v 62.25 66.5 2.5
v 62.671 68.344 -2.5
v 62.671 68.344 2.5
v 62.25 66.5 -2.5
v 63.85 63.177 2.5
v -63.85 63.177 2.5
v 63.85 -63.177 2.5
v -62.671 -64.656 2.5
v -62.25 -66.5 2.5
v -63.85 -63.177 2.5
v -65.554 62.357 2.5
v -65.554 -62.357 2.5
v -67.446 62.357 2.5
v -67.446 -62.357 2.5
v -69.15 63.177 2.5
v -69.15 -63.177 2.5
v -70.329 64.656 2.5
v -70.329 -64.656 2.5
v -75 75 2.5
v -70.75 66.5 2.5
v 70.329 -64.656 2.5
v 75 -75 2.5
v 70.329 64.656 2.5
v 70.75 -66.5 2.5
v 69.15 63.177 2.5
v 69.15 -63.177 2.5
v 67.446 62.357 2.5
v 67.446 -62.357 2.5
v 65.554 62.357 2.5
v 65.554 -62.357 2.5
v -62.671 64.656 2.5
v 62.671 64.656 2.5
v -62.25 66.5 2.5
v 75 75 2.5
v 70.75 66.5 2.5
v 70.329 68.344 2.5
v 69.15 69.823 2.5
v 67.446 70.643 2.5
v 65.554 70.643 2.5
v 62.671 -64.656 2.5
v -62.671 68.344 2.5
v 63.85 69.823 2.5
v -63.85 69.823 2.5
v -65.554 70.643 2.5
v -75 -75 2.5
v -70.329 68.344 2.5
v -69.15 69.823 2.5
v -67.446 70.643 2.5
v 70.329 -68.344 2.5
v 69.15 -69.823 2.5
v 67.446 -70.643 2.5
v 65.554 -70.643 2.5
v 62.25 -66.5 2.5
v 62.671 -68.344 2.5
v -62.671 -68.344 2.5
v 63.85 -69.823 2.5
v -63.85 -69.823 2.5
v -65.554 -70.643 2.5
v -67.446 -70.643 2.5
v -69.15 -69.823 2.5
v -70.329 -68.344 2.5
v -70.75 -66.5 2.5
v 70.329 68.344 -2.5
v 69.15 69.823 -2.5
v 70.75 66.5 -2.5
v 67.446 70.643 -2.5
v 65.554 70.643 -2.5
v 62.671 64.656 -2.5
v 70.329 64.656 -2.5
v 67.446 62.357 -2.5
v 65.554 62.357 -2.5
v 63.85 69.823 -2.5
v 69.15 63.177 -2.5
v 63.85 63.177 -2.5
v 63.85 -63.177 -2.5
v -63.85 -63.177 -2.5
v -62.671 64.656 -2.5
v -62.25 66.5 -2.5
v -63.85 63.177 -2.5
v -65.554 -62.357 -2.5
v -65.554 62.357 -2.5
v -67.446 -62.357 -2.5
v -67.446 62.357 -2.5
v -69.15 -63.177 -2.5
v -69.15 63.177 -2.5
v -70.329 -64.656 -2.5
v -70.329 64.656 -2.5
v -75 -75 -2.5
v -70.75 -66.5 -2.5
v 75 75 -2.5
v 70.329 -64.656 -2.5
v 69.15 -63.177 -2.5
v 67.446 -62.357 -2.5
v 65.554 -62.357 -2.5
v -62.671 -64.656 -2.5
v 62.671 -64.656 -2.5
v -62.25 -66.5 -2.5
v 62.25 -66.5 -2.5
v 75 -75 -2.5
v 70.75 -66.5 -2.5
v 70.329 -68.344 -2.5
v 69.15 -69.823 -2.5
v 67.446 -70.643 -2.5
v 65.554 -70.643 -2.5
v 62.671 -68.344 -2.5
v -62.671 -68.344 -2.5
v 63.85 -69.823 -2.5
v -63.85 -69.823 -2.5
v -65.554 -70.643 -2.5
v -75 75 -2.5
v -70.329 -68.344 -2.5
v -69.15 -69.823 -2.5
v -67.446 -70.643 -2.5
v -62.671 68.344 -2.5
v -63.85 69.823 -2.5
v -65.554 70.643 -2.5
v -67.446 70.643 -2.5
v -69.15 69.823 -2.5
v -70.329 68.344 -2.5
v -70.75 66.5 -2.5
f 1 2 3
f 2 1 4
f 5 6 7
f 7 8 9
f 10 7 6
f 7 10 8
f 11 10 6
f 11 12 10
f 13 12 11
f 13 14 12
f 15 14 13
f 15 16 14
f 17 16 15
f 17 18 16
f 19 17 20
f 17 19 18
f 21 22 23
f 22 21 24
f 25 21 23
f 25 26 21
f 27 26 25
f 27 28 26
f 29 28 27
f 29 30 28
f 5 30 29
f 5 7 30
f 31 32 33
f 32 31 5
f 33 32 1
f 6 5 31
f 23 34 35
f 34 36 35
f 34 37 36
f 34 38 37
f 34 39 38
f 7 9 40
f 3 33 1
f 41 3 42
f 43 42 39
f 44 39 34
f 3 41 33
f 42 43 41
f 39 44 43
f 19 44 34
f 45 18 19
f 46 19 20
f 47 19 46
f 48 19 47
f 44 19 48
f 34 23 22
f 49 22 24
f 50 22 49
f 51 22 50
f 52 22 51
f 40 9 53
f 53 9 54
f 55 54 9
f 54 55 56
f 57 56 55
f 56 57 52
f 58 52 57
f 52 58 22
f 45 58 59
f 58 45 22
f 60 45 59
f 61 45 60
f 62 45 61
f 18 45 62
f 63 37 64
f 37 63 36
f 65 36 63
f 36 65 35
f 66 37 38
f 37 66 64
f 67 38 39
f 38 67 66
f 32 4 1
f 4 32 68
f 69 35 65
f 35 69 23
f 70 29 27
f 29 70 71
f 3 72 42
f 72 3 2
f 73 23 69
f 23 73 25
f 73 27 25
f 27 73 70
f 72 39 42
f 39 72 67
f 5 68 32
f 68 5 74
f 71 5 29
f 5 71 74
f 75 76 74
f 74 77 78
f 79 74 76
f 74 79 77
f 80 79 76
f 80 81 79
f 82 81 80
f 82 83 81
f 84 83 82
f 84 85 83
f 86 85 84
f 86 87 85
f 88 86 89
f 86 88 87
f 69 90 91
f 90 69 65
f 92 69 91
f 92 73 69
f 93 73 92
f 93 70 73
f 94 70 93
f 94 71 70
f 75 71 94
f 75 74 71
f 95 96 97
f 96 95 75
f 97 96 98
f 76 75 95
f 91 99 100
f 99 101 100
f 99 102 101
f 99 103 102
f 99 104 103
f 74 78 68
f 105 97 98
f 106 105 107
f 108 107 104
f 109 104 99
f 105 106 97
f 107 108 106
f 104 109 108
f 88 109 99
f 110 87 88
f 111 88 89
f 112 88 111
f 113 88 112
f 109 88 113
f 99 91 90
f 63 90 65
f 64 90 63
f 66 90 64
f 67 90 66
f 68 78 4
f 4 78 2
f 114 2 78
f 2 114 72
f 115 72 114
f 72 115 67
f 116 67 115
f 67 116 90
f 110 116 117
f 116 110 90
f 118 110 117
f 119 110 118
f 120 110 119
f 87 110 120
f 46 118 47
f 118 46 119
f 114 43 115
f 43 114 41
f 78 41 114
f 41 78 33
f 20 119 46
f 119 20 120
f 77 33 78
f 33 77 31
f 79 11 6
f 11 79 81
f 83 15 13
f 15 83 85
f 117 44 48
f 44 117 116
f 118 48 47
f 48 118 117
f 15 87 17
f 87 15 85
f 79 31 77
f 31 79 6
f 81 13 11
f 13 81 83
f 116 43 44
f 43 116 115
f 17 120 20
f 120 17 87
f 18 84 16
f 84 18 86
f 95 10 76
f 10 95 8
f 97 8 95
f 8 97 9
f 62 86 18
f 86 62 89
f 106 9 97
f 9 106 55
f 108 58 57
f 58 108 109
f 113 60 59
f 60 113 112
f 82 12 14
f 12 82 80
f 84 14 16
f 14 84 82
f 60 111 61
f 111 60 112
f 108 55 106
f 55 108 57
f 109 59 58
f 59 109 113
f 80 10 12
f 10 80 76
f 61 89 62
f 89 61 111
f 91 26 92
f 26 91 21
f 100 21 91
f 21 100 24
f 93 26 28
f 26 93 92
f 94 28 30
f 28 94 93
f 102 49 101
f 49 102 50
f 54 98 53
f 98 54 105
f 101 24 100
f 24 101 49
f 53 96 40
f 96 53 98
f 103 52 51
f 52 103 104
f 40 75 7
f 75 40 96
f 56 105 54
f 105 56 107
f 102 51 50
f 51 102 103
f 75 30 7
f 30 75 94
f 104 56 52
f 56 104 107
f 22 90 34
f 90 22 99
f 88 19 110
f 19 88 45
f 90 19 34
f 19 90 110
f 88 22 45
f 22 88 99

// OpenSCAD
// Generated by SolidPython 1.1.3 on 2023-10-16 12:12:56


difference() {
	cube(center = true, size = [150, 150, 5]);
	union() {
		translate(v = [66.5000000000, 66.5000000000]) {
			cylinder(center = true, h = 5, r = 4.2500000000);
		}
		translate(v = [-66.5000000000, 66.5000000000]) {
			cylinder(center = true, h = 5, r = 4.2500000000);
		}
		translate(v = [-66.5000000000, -66.5000000000]) {
			cylinder(center = true, h = 5, r = 4.2500000000);
		}
		translate(v = [66.5000000000, -66.5000000000]) {
			cylinder(center = true, h = 5, r = 4.2500000000);
		}
	}
}
/***********************************************
*********      SolidPython code:      **********
************************************************
 
import solid
import numbers
import pudb
from solid.utils import *
import viewscad
import subprocess
import os
import os.path as osp
import math
import sys

chamfer_extrude=solid.import_scad("./chamfer_extrude.scad")
chamfer_extrude=chamfer_extrude.chamfer_extrude
r = viewscad.Renderer(width=800, height=800)

def debug(model,f_name,path="/home/ts/code/projects/mfd/designs/debug"):
    solid.scad_render_to_file(model,osp.join(path,f_name)+".scad")
#generate position list of wells using offset from center
wells_pos_from_center_4 = lambda offset: [[-offset,offset],
                                        [offset, offset],
                                        [-offset, -offset],
                                        [offset, -offset]]
#wells_pos_from_center_2 = lambda offset: [[0,offset],
#                                        [0, -offset]]
wells_pos_from_center_2 = lambda offset: [[offset,0],
                                        [-offset,0]]

def make_well(dims,shape=None,height=None,dxf=False):
    def circle_cylinder():
        if dxf or (height is None):
            well = solid.circle(r=dims, segments=64)
        else:
            well = solid.cylinder(r=dims, h=height, segments=64, center = True)
        return well
    if dims is None:
        sys.exit("radius needs to be a number")
    if isinstance(dims, numbers.Number):
        well =circle_cylinder()
    elif len(dims)==1:
        if isinstance(dims[1], numbers.Number):
            well =circle_cylinder()
        else:
            sys.exit("radius needs to be a number")
    elif len(dims)==2:
        well = solid.square(dims,center = True)
    elif len(dims)==3:
        well = solid.cube(dims, center = True)
    return well

def wells_top_bottom(center_gap,device_dims=None,shape=None,height=None, positions = None, dxf = False):
    well_shape = make_well(device_dims,shape=shape,height=height,dxf=dxf)
    wells = []
    if positions is None:
        offset = radius+radius/2.0
        positions = wells_pos_from_center_2(offset)
    if dxf or (height is None):
        height = 0
    for position in positions:
        if dxf:
            wells.append(solid.translate([position[0],position[1]])(well_shape))
        else:
            wells.append(solid.translate([position[0],position[1],height/2.0])(well_shape))
    return  union()(*wells)

#place wells in four corners 
def four_corner(radius,height=None, positions = None, dxf = False):
    #if well pos not specified set
    #to equally spaced by half radius
    if positions is None:
        offset = radius+radius/2.0
        positions = wells_pos_from_center_4(offset)
    if dxf or (height is None):
        height = 0
    #make wells at positions with specified radius and height
    wells = []
    for position in positions:
        #make circle if making dxf
        if dxf:
            well_shape = solid.circle(r=radius, segments=64)
            well_shape = solid.translate([position[0],position[1]])(well_shape)
        #if stl make cylinder
        else:
            well_shape = solid.cylinder(r=radius, h=height, segments=64, center = True)
            well_shape = solid.translate([position[0],position[1],height/2.0])(well_shape)
        wells.append(well_shape)
    return  union()(*wells)

#generate channels 
def make_channels(length,width,height=0,num_chans=1,max_chans=None,spacing=None, dxf = False,
                  rotate_channels=False):
    if dxf or (height is None):
        height = 0
    #if channel gap not defined, is equal to
    if spacing is None: spacing = width
    #calculate number of channels if fitting max num within given width
    if not max_chans is None:
        import math
        num_chans = math.floor((max_chans-spacing)/(width+spacing))
    #get total width of channel section  
    total_width = (width*num_chans)+(spacing*(num_chans-1))

    #make template channel
    #if rotate_channels: width, length = length, width
    if dxf:
        channel_t = solid.square([length,width],center = True)
    else:
        channel_t = solid.cube([length,width,height], center = True)

    #if number channels is even, offset the first channel to center its gap
    if num_chans % 2 == 0: centering = -(width/2.0+spacing/2.0)
    else: centering = 0
    #move template channel up to align bottom at z = 0 
    #and offset center if necessary
    if dxf:
        channel_t = solid.translate([0,centering])(channel_t)
    else:
        channel_t = solid.translate([0,centering,height/2.0])(channel_t)

    #if rotate_channels: length,width = width,length
    #start making the channels
    channels = []
    for i in range(num_chans):
        #if i=0 there is no translation
        #if i=1, we make the first channel adjacent to second
        direction = i

        #if i>=1, we add channels alternating left and right
        if i >= 1:
            direction = -(i/2.0)
            if i % 2 == 1: direction = (-direction)+0.5
                
        #make channel at right position and add it to channel list
        translation_coords = [0,direction*(width+spacing)]
        #if rotate_channels: translation_coords = [direction*(width+spacing),0]
        if dxf:
            channel = solid.translate(translation_coords)(channel_t)
        else:
            channel = solid.translate([*translation_coords,0])(channel_t)
        channels.append(channel)
    
    #group all channels as one object
    channels = union()(*channels)
    #compute the x,y,z dimensions in order to pass as arguments 
    #for construction of other parts of device (such as the chambers)
    measurements = {'x':(length/2.0,-length/2.0),
                    'y':(total_width/2.0,-total_width/2.0)}
    if not dxf:
        measurements['z'] = (height,0)
    if rotate_channels:
        channels = solid.rotate(90)(channels)
        measurements['x'],measurements['y']=measurements['y'],measurements['x']
    return channels,measurements

def make_chambers(msrs,height=None,extra=0,len_until=None,width=None, dxf = False):
    #computes x,y,z length
    total = lambda x : abs(x[0]) + abs(x[1])
    
    #if specific height if specified
    #otherwise use same height as channels
    if dxf:
        pass
    elif not height is None:
        msrs['z'] = (height,0)
    else:
        msrs['z'] = (0,0)
        
    #make copy of measurements from channels to modify chamber dimensions 
    #and add length to chambers as specified
    chamber_dims = msrs.copy()
    #calculate length of chamber to reach specified offset
    if not len_until is None:
        chamber_len = len_until-(msrs['x'][0])
    #or add specified length to channel length (if not specified, adds 0)
    else:
        chamber_len = msrs['x'][0]+extra
    #set the chamber length based 
    chamber_dims['x'] = (chamber_len/2.0,-(chamber_len/2.0))
    #compute final dimensions of chamber
    if not width is None:
        chamber_dims['y'] = (width/2.0,-width/2.0)
    chamber_dims = [total(size) for size in chamber_dims.values()]
        
    #calculate chamber translation offset to place adjacent to channels
    chamber_trslt = msrs['x'][0]+(chamber_len/2.0)
    #compute chamber translation coordinates to align with channels
    #x = 1 moves chamber above channels
    #x = -1 moves chamber below channels
    if dxf:
        trslt = lambda x : [x*(chamber_trslt),0]
    else:
        trslt = lambda x : [x*(chamber_trslt),0,msrs['z'][0]/2.0]
    
    #function to make chamber at top or at bottom 
    if dxf:
        move = lambda x : solid.translate(trslt(x))(solid.square(chamber_dims, center = True) )
    else:
        move = lambda x : solid.translate(trslt(x))(solid.cube(chamber_dims,center = True))
    #make top and bottom chambers and return them as grouped
    top = move(1)
    bottom = move(-1)
    #chambers=solid.rotate(90)(solid.union()(top,bottom))
    chambers=(solid.union()(top,bottom))

    return chambers

#create alignment features 
def alignment_features(unit,dims,grid_size, mask_size = None, alignment = "hollow", units_from_center = (2.5,2.5), corner_len=None):
    width = grid_size[0]*dims[0]
    length = grid_size[1]*dims[1]
    if mask_size is None and corner_len is None:
        corner_len = (dims[0] + dims[1]) /2 / 8
    corner = lambda thickness_div : solid.union()( solid.square([corner_len,corner_len/thickness_div],center=False), solid.square([corner_len/thickness_div,corner_len],center=False) )
    
    def make_full(thickness_div):
        thickness = corner_len/thickness_div
        tr = solid.translate([0, 0, 0 ])(solid.rotate(180)(corner(thickness_div)))
        tr = solid.translate([thickness/2,thickness/2,0])(tr)
        bl = solid.translate([0, 0, 0 ])(solid.rotate(0)(corner(thickness_div)))
        bl = solid.translate([-thickness/2,-thickness/2,0])(bl)
        return solid.union()(tr,bl)
    
    def make_hollow(thickness_div):
        thickness = corner_len/(thickness_div/2)
        inner = make_full(thickness_div)
        outer = make_full(thickness_div/2)
        hollow = outer - inner 
        return hollow
    
    center = (width /2 , length/2)
    mask_pos = lambda x,y : (center[0] + x*(float(units_from_center[0])*dims[0]), center[1] + y*(float(units_from_center[1])*dims[1]))
    positions = []
    positions.append(mask_pos(1,0))
    positions.append(mask_pos(0,1))
    positions.append(mask_pos(-1,0))
    positions.append(mask_pos(0,-1))
    make_mask = lambda mtype : make_hollow(8) if mtype == "hollow" else make_full(8)
    masks = [ solid.translate([*position,0])(make_mask(alignment)) for position in positions]
    
    solid.scad_render_to_file(solid.union()(*masks),"./designs/open_chamber/masks.scad")
    #return unit - solid.union()(*masks)
    return solid.union()(*masks,unit)

def create_outline(thickness, array, dims, grid_size,):
    width = grid_size[0]*dims[0] + thickness *2
    length = grid_size[1]*dims[1] + thickness *2
    outer = solid.translate([-thickness, -thickness,0])(solid.square([width, length]))
    return outer-array

def create_wall(wall_thickness, outline_thickness, dims, grid_size, wall_height = 2000, dxf = False):
    inner_width = grid_size[0]*dims[0] + outline_thickness *2
    inner_length = grid_size[1]*dims[1] + outline_thickness *2
    outer_width = inner_width + wall_thickness * 2
    outer_length = inner_length + wall_thickness * 2
    outer_pos_x = -outline_thickness-wall_thickness
    outer_pos_y = -outline_thickness-wall_thickness
    inner_pos_x = -outline_thickness
    inner_pos_y = -outline_thickness
    if dxf:
        inner_wall = solid.translate([inner_pos_x,
                                      inner_pos_y,
                                      0])(solid.square([inner_width, inner_length]))
        outer_wall = solid.translate([outer_pos_x,
                                      outer_pos_y,
                                      0])(solid.square([outer_width, outer_length]))

        return outer_wall-inner_wall
    else:
        inner_wall = solid.translate([inner_pos_x,
                                      inner_pos_y,
                                      0])(solid.cube([inner_width, inner_length,wall_height]))
        outer_wall = solid.translate([outer_pos_x,
                                      outer_pos_y,
                                      0])(solid.cube([outer_width, outer_length,wall_height]))

        return outer_wall-inner_wall, {'wall_height': wall_height,
                                       'wall_thickness': wall_thickness,
                                       'inner_width':inner_width,
                                       'inner_length': inner_length,
                                       'outer_width': outer_width,
                                       'outer_length': outer_length,
                                       'outer_pos_x' : outer_pos_x,
                                       'outer_pos_y' : outer_pos_y,
                                       'inner_pos_x' : inner_pos_x,
                                       'inner_pos_y' : inner_pos_y}

def create_thicker_wall(wall_thickness, outer_wall_offset, wall_dims, dims, grid_size, height_start = .2, height_end=2, dxf = False):
    addon_wall,thicker_wall_dims = create_wall(wall_thickness, outer_wall_offset, dims, grid_size, wall_height=height_end-height_start, dxf = False)
    addon_wall = solid.translate([0,0,height_start])(addon_wall)

    thicker_wall_dims['wall_height'] = height_end
    thicker_wall_dims['wall_thickness'] = wall_dims['wall_thickness'] + wall_thickness
    return addon_wall, thicker_wall_dims
 
def add_lock_to_wall(wall,wall_dims,y_offset = 0,cut_ratio=0.7,L_length=3, gap_ratio=0.05, axis="x",width_ratio=1/2):
    # Makes L shape
    def make_L(max_length,length_thickness,max_width,width_thickness,height,y_offset):
        length = solid.cube([max_length,length_thickness,height])
        width = solid.cube([width_thickness,max_width,height])
        width = solid.translate([max_length-(width_thickness),0,0])(width)
        L = solid.union()(width,length)
        debug(L,"L")
        if axis == "x":
            L = solid.rotate(-90)(L)
            L = solid.translate([0,max_length,0])(L)
        else:
            L = solid.rotate(-180)(L)
            L = solid.translate([max_length,max_width,0])(L)
        return solid.translate([0,0,y_offset])(L)
    
    lock_length = L_length
    lock_width = wall_dims['wall_thickness']*width_ratio
    lock_length_thickness = lock_width/2
    lock_width_thickness = lock_width/2
    L_lock = make_L(lock_length,lock_length_thickness,lock_width,lock_width_thickness, wall_dims['wall_height']-y_offset, y_offset)
    
    margin_space = lock_length - lock_length*(1-gap_ratio)
    key_length = lock_length-margin_space
    key_length_thickness = lock_length_thickness-(margin_space*2)
    key_width = lock_width-(margin_space*2)
    key_width_thickness = lock_width_thickness-(margin_space*2)
    L_key = make_L(key_length,key_length_thickness,key_width,key_width_thickness, wall_dims['wall_height']-y_offset, y_offset)
    L_key = solid.translate([margin_space,margin_space,0])(L_key)
    L = solid.union()(L_lock,L_key)
    debug(L,"L")
    
    #Make cube to be used as negative to split frame in a half
    #Can choose if making left or right negative, specify ratio of split
    def make_negative(right,cut_ratio):
        if axis == "x":
            if right:
                length = wall_dims['outer_length']*(1-cut_ratio)
                pos_x = wall_dims['outer_pos_x']+(wall_dims['outer_length']*cut_ratio)
            else:
                length = wall_dims['outer_length']*(cut_ratio)
                pos_x = wall_dims['outer_pos_x'] 
            negative = solid.cube([wall_dims['outer_width'],length, wall_dims['wall_height']])
            negative = solid.translate([wall_dims['outer_pos_y'],pos_x,0])(negative)
        else:
            if right:
                length = wall_dims['outer_width']*(1-cut_ratio)
                pos_x = wall_dims['outer_pos_y']+(wall_dims['outer_width']*cut_ratio)
            else:
                length = wall_dims['outer_width']*(cut_ratio)
                pos_x = wall_dims['outer_pos_y'] 
            negative = solid.cube([length,wall_dims['outer_length'], wall_dims['wall_height']])
            negative = solid.translate([pos_x,wall_dims['outer_pos_x'],0])(negative)
        return negative, pos_x, length 
                      
    #Make negatives
    negative_right, right_half_pos_x, right_half_length = make_negative(True,cut_ratio)
    negative_left, left_half_pos_x, right_half_length = make_negative(False,cut_ratio)
    #Make halves
    left_half = solid.difference()(wall,negative_right)
    right_half = solid.difference()(wall,negative_left)
    def place_L(L, L_length,L_width):
        #Place L on top wall       
        offset_to_center = (wall_dims['wall_thickness']-L_width)/2
        if axis == "x":
            y_pos_top = (wall_dims['outer_pos_y'] +
                    wall_dims['outer_width'] - 
                    L_width - offset_to_center)
            top_L = solid.translate([y_pos_top,
                                     right_half_pos_x-(L_length),
                                     0])(L)
            #Place L on bottom wall       
            y_pos_bottom = wall_dims['outer_pos_y']+offset_to_center
            bottom_L = solid.translate([y_pos_bottom,
                                        right_half_pos_x-L_length,
                                        0])(L)
        else:
            y_pos_top = (wall_dims['outer_pos_x'] +
                    wall_dims['outer_length'] -
                    (L_width+offset_to_center))
            top_L = solid.translate([right_half_pos_x-L_length,
                                     y_pos_top,
                                     0])(L)
            #Place L on bottom wall       
            y_pos_bottom = wall_dims['outer_pos_y']+offset_to_center
            bottom_L = solid.translate([right_half_pos_x-L_length,
                                        y_pos_bottom,
                                        0])(L)
        return bottom_L, top_L
    #Make complimentary L pieces through union and differences
    #Make Lock
    bottom_L_lock, top_L_lock = place_L(L_lock,L_length,lock_width)
    left_half = solid.difference()(left_half,bottom_L_lock)
    left_half = solid.difference()(left_half,top_L_lock)
    #Make Key
    bottom_L_key, top_L_key = place_L(L_key,L_length,lock_width)
    right_half = solid.union()(right_half,bottom_L_key)
    right_half = solid.union()(right_half,top_L_key)
    return left_half, right_half


#build a row x col grid of containment units
def make_unit_array(unit,dims,grid_size, dxf = False, alignment = None, mask_size = None,
                    units_from_center = None,alignment_offset=None, alignment_mark_size=1):
    units = []
    for col in range(grid_size[1]):
        for row in range(grid_size[0]):
            if dxf:
                units.append(solid.translate([row*dims[0],col*dims[1]])(unit))
            else:
                units.append(solid.translate([row*dims[0],col*dims[1],dims[2]/2.0])(unit))
    array = solid.union()(*units)
    if (not alignment is None) and dxf:
        if not alignment_offset is None:
            array = solid.translate([alignment_offset[0],alignment_offset[1]])(array)
        array = alignment_features(array,dims, grid_size, alignment = alignment, mask_size = None, units_from_center = units_from_center,corner_len=alignment_mark_size)
        if not alignment_offset is None:
            array = solid.translate([-alignment_offset[0],-alignment_offset[1]])(array)
    return array


def make_taylor(wells_pos = wells_pos_from_center_4(2.25), well_rad = 1.5 ,
                well_height = 2, chan_w = 0.01, chan_l = 1, chan_h = 0.010 ,
                chan_gap = 0.040, max_chans = None,num_chans=100, chamber_height  = 0.100,
                columns = 1, rows = 1, chamber_len_until=2.25, add_channels = True, add_wells = True, 
                add_chambers = True, save_path = "./", alignment = None, units_from_center = 2,
                mask_size = None, render_stl = False, outline_thickness = 0.050, dxf = True,
                wall_height = 15, wall_thickness = 0.95, casing_x=9, casing_y=9, casing_z=0,rotate_units=0):

    dims = [casing_x, casing_y, casing_z]
    wells = four_corner(well_rad,well_height, dxf = dxf, positions = wells_pos)
    debug(wells,"wells")
    channels, msrs = make_channels(chan_l,chan_w,chan_h,dxf=dxf, spacing = chan_gap, max_chans=max_chans,num_chans=num_chans)
    debug(channels,"channels")
    chambers = make_chambers(msrs,dxf = dxf, height=chamber_height,len_until=chamber_len_until)
    debug(chambers,"chambers")

    #add together and render
    device_parts = []
    if add_channels:
        device_parts.append(channels)
    if add_wells:
        device_parts.append(wells)
    if add_chambers:
        device_parts.append(chambers)
    device=union()(*device_parts)
    device = rotate(rotate_units)(device)

    device=solid.translate([dims[0]/2.0,dims[1]/2.0,0])(device)
    channels = rotate(rotate_units)(channels)
    channels=solid.translate([dims[0]/2,dims[1]/2,0])(channels)
    chambers_wells = union()(wells,chambers)
    chambers_wells = rotate(rotate_units)(chambers_wells)
    chambers_wells=solid.translate([dims[0]/2,dims[1]/2,0])(chambers_wells)

    file_name = str(rows)+'x'+str(columns)+'_units_'
    grid_size = [rows,columns]

    if alignment:
        alignment="full"
    device = make_unit_array(device,dims,grid_size, dxf=dxf, alignment = alignment,
                                 units_from_center = units_from_center)
    channels = make_unit_array(channels,dims,grid_size, dxf=dxf, alignment = alignment,
                                 units_from_center = units_from_center)
    if alignment=="full":
        alignment="hollow"

    chambers_wells = make_unit_array(chambers_wells,dims,grid_size, dxf=dxf, alignment = alignment,
                                 units_from_center =units_from_center)

    def save_model(model,prefix):
        model_fname = os.path.abspath(save_path+prefix+"_"+file_name+".scad")
        solid.scad_render_to_file(model,model_fname)
        return model_fname

    wells_fname = save_model(wells,"wells")
    channels_fname = save_model(channels,"channels")
    device_fname = save_model(device,"device")
    chambers_wells_fname = save_model(chambers_wells,"chambers_wells")
    return (chambers_wells,chambers_wells_fname), (channels,channels_fname), (device,device_fname)

def make_device(design='open',rows=8,columns=6,wells_pos = 4.5,well_offset=3.2, well_rad=3.2,well_height=0.1,
                chan_l=1,chan_w=0.01,chan_h=0.01,chan_gap=0.015,num_chans=101,dxf=True,save_path="./designs/open_chamber/",
                casing_x=9.0,casing_y=18.0,casing_z=0,rotate_units=90,units_from_center=(3,1),chamber_len_until=4.5,
                chamber_width=None,alignment=True, add_wells=True, add_channels=True,add_chambers=True):

    dims = [casing_x, casing_y, casing_z]
    if design == "open":
        wells_pos=wells_pos_from_center_2(wells_pos)
        wells = wells_top_bottom(well_offset*2,device_dims=well_rad,height=well_height, dxf = dxf, positions = wells_pos)
    elif design == "closed":
        wells_pos=wells_pos_from_center_4(wells_pos)
        debug(wells,"wells")
        wells = four_corner(well_offset,well_heightdevice_dims=well_rad, dxf = dxf, positions = wells_pos)
    else:
        print(design+" is not a valid design.\n Choose valid design: 'open' or 'closed'")
        exit()
    wells = rotate(rotate_units)(wells)
    wells=solid.translate([dims[0]/2,dims[1]/2,0])(wells)
    debug(wells,"wells")

    channels, msrs = make_channels(chan_l,chan_w,chan_h,dxf=dxf, spacing = chan_gap, num_chans=num_chans,rotate_channels=False)
    channels = rotate(rotate_units)(channels)
    channels=solid.translate([dims[0]/2,dims[1]/2,0])(channels)

    chambers=make_chambers(msrs,height=None,extra=0,len_until=chamber_len_until, width=chamber_width,dxf = dxf)
    chambers = rotate(rotate_units)(chambers)
    chambers=solid.translate([dims[0]/2,dims[1]/2,0])(chambers)

    device_parts = []
    if add_channels:
        device_parts.append(channels)
    if add_wells:
        device_parts.append(wells)
    if add_chambers:
        device_parts.append(chambers)
    device = union()(*device_parts)
    #device = rotate(rotate_units)(device)
    #device=solid.translate([dims[0]/2.0,dims[1]/2.0,0])(device)

    chambers_wells = []
    if add_chambers:
        chambers_wells.append(chambers)
    if add_wells:
        chambers_wells.append(wells)
    chambers_wells = union()(*chambers_wells)
    #chambers_wells = union()(wells,chambers)
    #chambers_wells = rotate(rotate_units)(chambers_wells)
    #chambers_wells=solid.translate([dims[0]/2,dims[1]/2,0])(chambers_wells)

    file_name = str(rows)+'x'+str(columns)+'_units_'

    grid_size = [rows,columns]
    if alignment:
        alignment="full"
    device = make_unit_array(device,dims,grid_size, dxf=dxf, alignment = alignment,
                                 units_from_center = units_from_center)
    channels = make_unit_array(channels,dims,grid_size, dxf=dxf, alignment = alignment,
                                 units_from_center = units_from_center)
    if alignment=="full":
        alignment="hollow"

    chambers_wells = make_unit_array(chambers_wells,dims,grid_size, dxf=dxf, alignment = alignment,
                                 units_from_center =units_from_center)

    def save_model(model,prefix):
        model_fname = os.path.abspath(save_path+prefix+"_"+file_name+".scad")
        solid.scad_render_to_file(model,model_fname)
        return model_fname

    wells_fname = save_model(wells,"wells")
    channels_fname = save_model(channels,"channels")
    device_fname = save_model(device,"device")
    chambers_wells_fname = save_model(chambers_wells,"chambers_wells")
    return (chambers_wells,chambers_wells_fname), (channels,channels_fname), (device,device_fname)


def make_open_chamber(rows=8,columns=6,wells_pos = wells_pos_from_center_2(4.5), well_rad=3.2,well_height=0.1,
                      chan_l=1,chan_w=0.01,chan_h=0.01,chan_gap=0.015,num_chans=101,dxf=True,save_path="./designs/open_chamber/",
                      casing_x=9.0,casing_y=18.0,casing_z=0,rotate_units=90,units_from_center=(3,1),chamber_len_until=4.5,
                      chamber_width=None,alignment=True, add_wells=True, add_channels=True,add_chambers=True):

    dims = [casing_x, casing_y, casing_z]
    wells = wells_top_bottom(well_rad,height=well_height, dxf = dxf, positions = wells_pos)
    channels, msrs = make_channels(chan_l,chan_w,chan_h,dxf=dxf, spacing = chan_gap, num_chans=num_chans,rotate_channels=False)
    chambers=make_chambers(msrs,height=None,extra=0,len_until=chamber_len_until, width=chamber_width,dxf = dxf)
    debug(chambers,"chambers")
    device_parts = []
    if add_channels:
        device_parts.append(channels)
    if add_wells:
        device_parts.append(wells)
    if add_chambers:
        device_parts.append(chambers)
    device = union()(*device_parts)
    device = rotate(rotate_units)(device)
    device=solid.translate([dims[0]/2.0,dims[1]/2.0,0])(device)
    channels = rotate(rotate_units)(channels)
    channels=solid.translate([dims[0]/2,dims[1]/2,0])(channels)
    chambers_wells = union()(wells,chambers)
    chambers_wells = rotate(rotate_units)(chambers_wells)
    chambers_wells=solid.translate([dims[0]/2,dims[1]/2,0])(chambers_wells)

    file_name = str(rows)+'x'+str(columns)+'_units_'

    grid_size = [rows,columns]
    if alignment:
        alignment="full"
    device = make_unit_array(device,dims,grid_size, dxf=dxf, alignment = alignment,
                                 units_from_center = units_from_center)
    channels = make_unit_array(channels,dims,grid_size, dxf=dxf, alignment = alignment,
                                 units_from_center = units_from_center)
    if alignment=="full":
        alignment="hollow"

    chambers_wells = make_unit_array(chambers_wells,dims,grid_size, dxf=dxf, alignment = alignment,
                                 units_from_center =units_from_center)

    def save_model(model,prefix):
        model_fname = os.path.abspath(save_path+prefix+"_"+file_name+".scad")
        solid.scad_render_to_file(model,model_fname)
        return model_fname

    wells_fname = save_model(wells,"wells")
    channels_fname = save_model(channels,"channels")
    device_fname = save_model(device,"device")
    chambers_wells_fname = save_model(chambers_wells,"chambers_wells")
    return (chambers_wells,chambers_wells_fname), (channels,channels_fname), (device,device_fname)

def to_dxf(scad_path):
    dxf_path = scad_path.replace(".scad",".dxf")
    subprocess.call(["openscad", "-o", dxf_path, scad_path])
    import ezdxf
    temp_dxf = ezdxf.readfile(dxf_path)
    temp_dxf.saveas(dxf_path)

#def make_walls(diameter,thickness,grid_size,dims,height=20,segments=256,make_inner=True):
#    wafer_wall_out = solid.cylinder(r=diameter/2,h=height, segments=segments)
#    wafer_wall_in = solid.cylinder(r=(diameter/2-thickness),h=height, segments=segments)
#    wafer_wall = solid.difference()(wafer_wall_out,wafer_wall_in)
#    wafer_wall = solid.translate([grid_size[1]*dims[1]/2.0,grid_size[0]*dims[0]/2.0])(wafer_wall)
#
#    vertical_wall_length = grid_size[1]*dims[1]
#    horizontal_wall_length = grid_size[0]*dims[0]
#    vertical_wall = solid.cube([vertical_wall_length,thickness,height],center = True)
#    vertical_wall = solid.translate([vertical_wall_length/2,0,height/2])(vertical_wall)
#    horizontal_wall = solid.cube([thickness,horizontal_wall_length,height],center = True)
#    horizontal_wall = solid.translate([0,vertical_wall_length/2,height/2])(horizontal_wall)
#    walls = []
#    walls.append(horizontal_wall)
#    walls.append(vertical_wall)
#    for col in range(grid_size[1]):
#        if col == grid_size[1]-1: 
#            walls.append(solid.translate([0,(col+1)*dims[1]])(vertical_wall))
#        elif col > 0 and col < grid_size[1]-1 and make_inner==True:
#            walls.append(solid.translate([0,(col+1)*dims[1]])(vertical_wall))
#    for row in range(grid_size[0]):
#        if row == grid_size[0]-1: 
#            walls.append(solid.translate([(row+1)*dims[0],0])(horizontal_wall))
#        elif row > 0 and row < grid_size[0]-1 and make_inner==True:
#            walls.append(solid.translate([(row+1)*dims[0],0])(horizontal_wall))
#    walls = union()(*walls)
#    wafer_walls = union()(walls,wafer_wall)
#    return walls,wafer_wall,wafer_walls

def make_walls(diameter,thickness,grid_size,dims,height=20,segments=256,make_inner=True,padx=0,pady=0):
    wafer_wall_out = solid.cylinder(r=diameter/2,h=height, segments=segments)
    wafer_wall_in = solid.cylinder(r=(diameter/2-thickness),h=height, segments=segments)
    wafer_wall = solid.difference()(wafer_wall_out,wafer_wall_in)
    wafer_wall = solid.translate([grid_size[1]*dims[1]/2.0,grid_size[0]*dims[0]/2.0])(wafer_wall)

    vertical_wall_length = grid_size[0]*dims[0]+padx
    horizontal_wall_length = grid_size[1]*dims[1]+pady
    vertical_wall = solid.cube([vertical_wall_length,thickness,height],center = True)
    vertical_wall = solid.translate([vertical_wall_length/2-pady/2,-padx/2,height/2])(vertical_wall)
    horizontal_wall = solid.cube([thickness,horizontal_wall_length,height],center = True)
    horizontal_wall = solid.translate([-pady/2,horizontal_wall_length/2-padx/2,height/2])(horizontal_wall)
    walls = []
    walls.append(horizontal_wall)
    walls.append(vertical_wall)
    for col in range(grid_size[1]):
        if col == grid_size[1]-1: 
            walls.append(solid.translate([0,(col+1)*dims[1]+pady])(vertical_wall))
        elif col > 0 and col < grid_size[1]-1 and make_inner==True:
            walls.append(solid.translate([0,(col+1)*dims[1]])(vertical_wall))
    for row in range(grid_size[0]):
        if row == grid_size[0]-1: 
            walls.append(solid.translate([(row+1)*dims[0]+padx,0])(horizontal_wall))
        elif row > 0 and row < grid_size[0]-1 and make_inner==True:
            walls.append(solid.translate([(row+1)*dims[0],0])(horizontal_wall))
    walls = union()(*walls)
    wafer_walls = union()(walls,wafer_wall)
    return walls,wafer_wall,wafer_walls

def save_model(model,base_path,base_name,dxf=True):
    if not os.path.exists(base_path):
        os.makedirs(base_path)
    dxf_path=osp.join(base_path,base_name+".scad")
    solid.scad_render_to_file(model,osp.join(dxf_path))
    if dxf:
        to_dxf(dxf_path)

def make_wafer(diameter,flat_len,thickness):
    wafer = solid.cylinder(r1=diameter/2,r2=diameter/2,h=thickness,segments=512,)()
    x_start_flat=(flat_len/2)
    y_start_flat = math.sqrt(((diameter/2)**2) - (x_start_flat**2) )
    height_delete_flat=diameter/2-y_start_flat
    flat_delete = solid.cube([flat_len,height_delete_flat,thickness],center=False)()
    flat_delete = solid.translate([-flat_len/2,y_start_flat,0])(flat_delete)
    wafer = solid.difference()(wafer,flat_delete)
    wafer = solid.rotate(90)(wafer)
    return wafer

def add_wafer_to_mask(wafer_size,flat_len,mask,grid_size,dims,wafer_line_thickness=0.1,outer_mask_thickness=5,alignment_offset=None):
    def make_wafer_mask(wafer_size,flat_len):
        wafer_mask = make_wafer(wafer_size,flat_len,1)
        wafer_mask = solid.projection()(wafer_mask)
        wafer_mask = solid.translate([grid_size[0]*dims[0]/2.0,grid_size[1]*dims[1]/2.0])(wafer_mask)
        if not alignment_offset is None:
            wafer_mask = solid.translate([-alignment_offset[0],-alignment_offset[1]])(wafer_mask)
        return wafer_mask

    inner_wafer_line_mask = make_wafer_mask(wafer_size-wafer_line_thickness/2,flat_len)
    outer_wafer_line_mask = make_wafer_mask(wafer_size+wafer_line_thickness/2,flat_len)
    outer_wafer_mask = make_wafer_mask(wafer_size+outer_mask_thickness,flat_len)
    outer_wafer_mask = solid.difference()(outer_wafer_mask,outer_wafer_line_mask)
    wafer_mask = solid.union()(outer_wafer_mask,inner_wafer_line_mask)

    return solid.difference()(wafer_mask,mask)

def make_posts(post_shape,post_height):
    posts = solid.linear_extrude(height=post_height)(post_shape)
    return posts

def make_wafer_empty(diameter,flat_len,thickness,margin,notch_len=20,notch_height=5,oversize=1.01):
    diameter*=oversize
    flat_len*=oversize
    wafer = make_wafer(diameter,flat_len,thickness)
    holder = solid.cylinder(r1=diameter/2+margin,r2=diameter/2+margin,h=thickness,segments=512)()
    holder = solid.difference()(holder,wafer)

    x_start_flat=(flat_len/2)
    y_start_flat = math.sqrt(((diameter/2)**2) - (x_start_flat**2) )
    height_delete_flat=diameter/2-y_start_flat
    notch = solid.cube([notch_len,notch_height,thickness],center=False)()
    notch = solid.translate([-notch_len/2,y_start_flat,0])(notch)
    notch = solid.rotate(90)(notch)
    return solid.difference()(holder,notch)

def wafer_print_calibration(diameter,thickness,height,z_offset):
    circles = []
    radii = []
    radii.append(diameter/2.0*0.8)
    radii.append(diameter/2.0*0.6)
    radii.append(diameter/2.0*0.4)
    radii.append(diameter/2.0*0.2)
    for radius in radii:
        inner = solid.cylinder(r1=radius-(thickness/2.0),r2=radius-(thickness/2.0),h=thickness,segments=512,)()
        outer = solid.cylinder(r1=radius+(thickness/2.0),r2=radius+(thickness/2.0),h=thickness,segments=512,)()
        diff = solid.difference()(outer,inner)
        circles.append(diff)
    circles = solid.union()(*circles)
    circles = solid.translate([0,0,z_offset])(circles)
    return circles

def make_rack(wells,dims,grid_size,alignment_offset,rack_x,rack_y,rack_thickness,bolt_width,add_bolts=True):

    #get X and Y dimensions of gride of pipette tips
    X_len = dims[0]*grid_size[0]
    Y_len = dims[1]*grid_size[1]
    #make rack
    rack = solid.cube([rack_x,rack_y,rack_thickness],center=True)

    if add_bolts:
    #add bolt holes
        bolt_hole=solid.cylinder(r=bolt_width/2,h=rack_thickness,center=True)()
        bolt_holes = []
        bolt_holes.append(solid.translate([rack_x/2-1.5*bolt_width,rack_y/2-1.5*bolt_width])(bolt_hole))
        bolt_holes.append(solid.translate([-rack_x/2+1.5*bolt_width,rack_y/2-1.5*bolt_width])(bolt_hole))
        bolt_holes.append(solid.translate([-rack_x/2+1.5*bolt_width,-rack_y/2+1.5*bolt_width])(bolt_hole))
        bolt_holes.append(solid.translate([rack_x/2-1.5*bolt_width,-rack_y/2+1.5*bolt_width])(bolt_hole))
        bolt_holes = solid.union()(*bolt_holes)
        rack=solid.difference()(rack,bolt_holes)
    rack_support = rack

    #center rack with pipette holes
    rack = solid.translate([0,0,rack_thickness/2])(rack)
    rack = solid.translate([X_len/2,Y_len/2])(rack)
    rack = solid.translate([-alignment_offset[0],-alignment_offset[1]])(rack)
    wells = solid.linear_extrude(height=rack_thickness)(wells)
    rack = solid.difference()(rack,wells)
    return rack, rack_support

def make_pillar(wells,dims,grid_size,alignment_offset,rack_x,rack_y,pillar_height,rack_thickness,bolt_width,add_bolts=True,taper_angle=1,bolt_position_corner=1.5):

    #get X and Y dimensions of gride of pipette tips
    X_len = dims[0]*grid_size[0]
    Y_len = dims[1]*grid_size[1]
    #make rack
    rack = solid.cube([rack_x,rack_y,rack_thickness],center=True)
    
    if add_bolts:
    #add bolt holes
        bolt_hole=solid.cylinder(r=bolt_width/2,h=rack_thickness,center=True)()
        bolt_holes = []
        bolt_holes.append(solid.translate([rack_x/2-bolt_position_corner*bolt_width,rack_y/2-bolt_position_corner*bolt_width])(bolt_hole))
        bolt_holes.append(solid.translate([-rack_x/2+bolt_position_corner*bolt_width,rack_y/2-bolt_position_corner*bolt_width])(bolt_hole))
        bolt_holes.append(solid.translate([-rack_x/2+bolt_position_corner*bolt_width,-rack_y/2+bolt_position_corner*bolt_width])(bolt_hole))
        bolt_holes.append(solid.translate([rack_x/2-bolt_position_corner*bolt_width,-rack_y/2+bolt_position_corner*bolt_width])(bolt_hole))
        bolt_holes = solid.union()(*bolt_holes)
        rack=solid.difference()(rack,bolt_holes)
    rack_support = rack

    #center rack with pipette holes
    #rack = solid.translate([0,0,-rack_thickness])(rack)
    rack = solid.translate([X_len/2,Y_len/2])(rack)
    rack = solid.translate([-alignment_offset[0],-alignment_offset[1]])(rack)
    if not taper_angle == 0:
        wells=chamfer_extrude(pillar_height,taper_angle,segments=20)(wells)
    else:
        wells = solid.linear_extrude(height=pillar_height)(wells)
    rack = solid.union()(rack,wells)
    return rack, rack_support

def deg_taper_len(height,deg):
    if not deg == 0:
        return height*math.tan(math.radians(deg))
    else:
        return 0









 
 
************************************************/
